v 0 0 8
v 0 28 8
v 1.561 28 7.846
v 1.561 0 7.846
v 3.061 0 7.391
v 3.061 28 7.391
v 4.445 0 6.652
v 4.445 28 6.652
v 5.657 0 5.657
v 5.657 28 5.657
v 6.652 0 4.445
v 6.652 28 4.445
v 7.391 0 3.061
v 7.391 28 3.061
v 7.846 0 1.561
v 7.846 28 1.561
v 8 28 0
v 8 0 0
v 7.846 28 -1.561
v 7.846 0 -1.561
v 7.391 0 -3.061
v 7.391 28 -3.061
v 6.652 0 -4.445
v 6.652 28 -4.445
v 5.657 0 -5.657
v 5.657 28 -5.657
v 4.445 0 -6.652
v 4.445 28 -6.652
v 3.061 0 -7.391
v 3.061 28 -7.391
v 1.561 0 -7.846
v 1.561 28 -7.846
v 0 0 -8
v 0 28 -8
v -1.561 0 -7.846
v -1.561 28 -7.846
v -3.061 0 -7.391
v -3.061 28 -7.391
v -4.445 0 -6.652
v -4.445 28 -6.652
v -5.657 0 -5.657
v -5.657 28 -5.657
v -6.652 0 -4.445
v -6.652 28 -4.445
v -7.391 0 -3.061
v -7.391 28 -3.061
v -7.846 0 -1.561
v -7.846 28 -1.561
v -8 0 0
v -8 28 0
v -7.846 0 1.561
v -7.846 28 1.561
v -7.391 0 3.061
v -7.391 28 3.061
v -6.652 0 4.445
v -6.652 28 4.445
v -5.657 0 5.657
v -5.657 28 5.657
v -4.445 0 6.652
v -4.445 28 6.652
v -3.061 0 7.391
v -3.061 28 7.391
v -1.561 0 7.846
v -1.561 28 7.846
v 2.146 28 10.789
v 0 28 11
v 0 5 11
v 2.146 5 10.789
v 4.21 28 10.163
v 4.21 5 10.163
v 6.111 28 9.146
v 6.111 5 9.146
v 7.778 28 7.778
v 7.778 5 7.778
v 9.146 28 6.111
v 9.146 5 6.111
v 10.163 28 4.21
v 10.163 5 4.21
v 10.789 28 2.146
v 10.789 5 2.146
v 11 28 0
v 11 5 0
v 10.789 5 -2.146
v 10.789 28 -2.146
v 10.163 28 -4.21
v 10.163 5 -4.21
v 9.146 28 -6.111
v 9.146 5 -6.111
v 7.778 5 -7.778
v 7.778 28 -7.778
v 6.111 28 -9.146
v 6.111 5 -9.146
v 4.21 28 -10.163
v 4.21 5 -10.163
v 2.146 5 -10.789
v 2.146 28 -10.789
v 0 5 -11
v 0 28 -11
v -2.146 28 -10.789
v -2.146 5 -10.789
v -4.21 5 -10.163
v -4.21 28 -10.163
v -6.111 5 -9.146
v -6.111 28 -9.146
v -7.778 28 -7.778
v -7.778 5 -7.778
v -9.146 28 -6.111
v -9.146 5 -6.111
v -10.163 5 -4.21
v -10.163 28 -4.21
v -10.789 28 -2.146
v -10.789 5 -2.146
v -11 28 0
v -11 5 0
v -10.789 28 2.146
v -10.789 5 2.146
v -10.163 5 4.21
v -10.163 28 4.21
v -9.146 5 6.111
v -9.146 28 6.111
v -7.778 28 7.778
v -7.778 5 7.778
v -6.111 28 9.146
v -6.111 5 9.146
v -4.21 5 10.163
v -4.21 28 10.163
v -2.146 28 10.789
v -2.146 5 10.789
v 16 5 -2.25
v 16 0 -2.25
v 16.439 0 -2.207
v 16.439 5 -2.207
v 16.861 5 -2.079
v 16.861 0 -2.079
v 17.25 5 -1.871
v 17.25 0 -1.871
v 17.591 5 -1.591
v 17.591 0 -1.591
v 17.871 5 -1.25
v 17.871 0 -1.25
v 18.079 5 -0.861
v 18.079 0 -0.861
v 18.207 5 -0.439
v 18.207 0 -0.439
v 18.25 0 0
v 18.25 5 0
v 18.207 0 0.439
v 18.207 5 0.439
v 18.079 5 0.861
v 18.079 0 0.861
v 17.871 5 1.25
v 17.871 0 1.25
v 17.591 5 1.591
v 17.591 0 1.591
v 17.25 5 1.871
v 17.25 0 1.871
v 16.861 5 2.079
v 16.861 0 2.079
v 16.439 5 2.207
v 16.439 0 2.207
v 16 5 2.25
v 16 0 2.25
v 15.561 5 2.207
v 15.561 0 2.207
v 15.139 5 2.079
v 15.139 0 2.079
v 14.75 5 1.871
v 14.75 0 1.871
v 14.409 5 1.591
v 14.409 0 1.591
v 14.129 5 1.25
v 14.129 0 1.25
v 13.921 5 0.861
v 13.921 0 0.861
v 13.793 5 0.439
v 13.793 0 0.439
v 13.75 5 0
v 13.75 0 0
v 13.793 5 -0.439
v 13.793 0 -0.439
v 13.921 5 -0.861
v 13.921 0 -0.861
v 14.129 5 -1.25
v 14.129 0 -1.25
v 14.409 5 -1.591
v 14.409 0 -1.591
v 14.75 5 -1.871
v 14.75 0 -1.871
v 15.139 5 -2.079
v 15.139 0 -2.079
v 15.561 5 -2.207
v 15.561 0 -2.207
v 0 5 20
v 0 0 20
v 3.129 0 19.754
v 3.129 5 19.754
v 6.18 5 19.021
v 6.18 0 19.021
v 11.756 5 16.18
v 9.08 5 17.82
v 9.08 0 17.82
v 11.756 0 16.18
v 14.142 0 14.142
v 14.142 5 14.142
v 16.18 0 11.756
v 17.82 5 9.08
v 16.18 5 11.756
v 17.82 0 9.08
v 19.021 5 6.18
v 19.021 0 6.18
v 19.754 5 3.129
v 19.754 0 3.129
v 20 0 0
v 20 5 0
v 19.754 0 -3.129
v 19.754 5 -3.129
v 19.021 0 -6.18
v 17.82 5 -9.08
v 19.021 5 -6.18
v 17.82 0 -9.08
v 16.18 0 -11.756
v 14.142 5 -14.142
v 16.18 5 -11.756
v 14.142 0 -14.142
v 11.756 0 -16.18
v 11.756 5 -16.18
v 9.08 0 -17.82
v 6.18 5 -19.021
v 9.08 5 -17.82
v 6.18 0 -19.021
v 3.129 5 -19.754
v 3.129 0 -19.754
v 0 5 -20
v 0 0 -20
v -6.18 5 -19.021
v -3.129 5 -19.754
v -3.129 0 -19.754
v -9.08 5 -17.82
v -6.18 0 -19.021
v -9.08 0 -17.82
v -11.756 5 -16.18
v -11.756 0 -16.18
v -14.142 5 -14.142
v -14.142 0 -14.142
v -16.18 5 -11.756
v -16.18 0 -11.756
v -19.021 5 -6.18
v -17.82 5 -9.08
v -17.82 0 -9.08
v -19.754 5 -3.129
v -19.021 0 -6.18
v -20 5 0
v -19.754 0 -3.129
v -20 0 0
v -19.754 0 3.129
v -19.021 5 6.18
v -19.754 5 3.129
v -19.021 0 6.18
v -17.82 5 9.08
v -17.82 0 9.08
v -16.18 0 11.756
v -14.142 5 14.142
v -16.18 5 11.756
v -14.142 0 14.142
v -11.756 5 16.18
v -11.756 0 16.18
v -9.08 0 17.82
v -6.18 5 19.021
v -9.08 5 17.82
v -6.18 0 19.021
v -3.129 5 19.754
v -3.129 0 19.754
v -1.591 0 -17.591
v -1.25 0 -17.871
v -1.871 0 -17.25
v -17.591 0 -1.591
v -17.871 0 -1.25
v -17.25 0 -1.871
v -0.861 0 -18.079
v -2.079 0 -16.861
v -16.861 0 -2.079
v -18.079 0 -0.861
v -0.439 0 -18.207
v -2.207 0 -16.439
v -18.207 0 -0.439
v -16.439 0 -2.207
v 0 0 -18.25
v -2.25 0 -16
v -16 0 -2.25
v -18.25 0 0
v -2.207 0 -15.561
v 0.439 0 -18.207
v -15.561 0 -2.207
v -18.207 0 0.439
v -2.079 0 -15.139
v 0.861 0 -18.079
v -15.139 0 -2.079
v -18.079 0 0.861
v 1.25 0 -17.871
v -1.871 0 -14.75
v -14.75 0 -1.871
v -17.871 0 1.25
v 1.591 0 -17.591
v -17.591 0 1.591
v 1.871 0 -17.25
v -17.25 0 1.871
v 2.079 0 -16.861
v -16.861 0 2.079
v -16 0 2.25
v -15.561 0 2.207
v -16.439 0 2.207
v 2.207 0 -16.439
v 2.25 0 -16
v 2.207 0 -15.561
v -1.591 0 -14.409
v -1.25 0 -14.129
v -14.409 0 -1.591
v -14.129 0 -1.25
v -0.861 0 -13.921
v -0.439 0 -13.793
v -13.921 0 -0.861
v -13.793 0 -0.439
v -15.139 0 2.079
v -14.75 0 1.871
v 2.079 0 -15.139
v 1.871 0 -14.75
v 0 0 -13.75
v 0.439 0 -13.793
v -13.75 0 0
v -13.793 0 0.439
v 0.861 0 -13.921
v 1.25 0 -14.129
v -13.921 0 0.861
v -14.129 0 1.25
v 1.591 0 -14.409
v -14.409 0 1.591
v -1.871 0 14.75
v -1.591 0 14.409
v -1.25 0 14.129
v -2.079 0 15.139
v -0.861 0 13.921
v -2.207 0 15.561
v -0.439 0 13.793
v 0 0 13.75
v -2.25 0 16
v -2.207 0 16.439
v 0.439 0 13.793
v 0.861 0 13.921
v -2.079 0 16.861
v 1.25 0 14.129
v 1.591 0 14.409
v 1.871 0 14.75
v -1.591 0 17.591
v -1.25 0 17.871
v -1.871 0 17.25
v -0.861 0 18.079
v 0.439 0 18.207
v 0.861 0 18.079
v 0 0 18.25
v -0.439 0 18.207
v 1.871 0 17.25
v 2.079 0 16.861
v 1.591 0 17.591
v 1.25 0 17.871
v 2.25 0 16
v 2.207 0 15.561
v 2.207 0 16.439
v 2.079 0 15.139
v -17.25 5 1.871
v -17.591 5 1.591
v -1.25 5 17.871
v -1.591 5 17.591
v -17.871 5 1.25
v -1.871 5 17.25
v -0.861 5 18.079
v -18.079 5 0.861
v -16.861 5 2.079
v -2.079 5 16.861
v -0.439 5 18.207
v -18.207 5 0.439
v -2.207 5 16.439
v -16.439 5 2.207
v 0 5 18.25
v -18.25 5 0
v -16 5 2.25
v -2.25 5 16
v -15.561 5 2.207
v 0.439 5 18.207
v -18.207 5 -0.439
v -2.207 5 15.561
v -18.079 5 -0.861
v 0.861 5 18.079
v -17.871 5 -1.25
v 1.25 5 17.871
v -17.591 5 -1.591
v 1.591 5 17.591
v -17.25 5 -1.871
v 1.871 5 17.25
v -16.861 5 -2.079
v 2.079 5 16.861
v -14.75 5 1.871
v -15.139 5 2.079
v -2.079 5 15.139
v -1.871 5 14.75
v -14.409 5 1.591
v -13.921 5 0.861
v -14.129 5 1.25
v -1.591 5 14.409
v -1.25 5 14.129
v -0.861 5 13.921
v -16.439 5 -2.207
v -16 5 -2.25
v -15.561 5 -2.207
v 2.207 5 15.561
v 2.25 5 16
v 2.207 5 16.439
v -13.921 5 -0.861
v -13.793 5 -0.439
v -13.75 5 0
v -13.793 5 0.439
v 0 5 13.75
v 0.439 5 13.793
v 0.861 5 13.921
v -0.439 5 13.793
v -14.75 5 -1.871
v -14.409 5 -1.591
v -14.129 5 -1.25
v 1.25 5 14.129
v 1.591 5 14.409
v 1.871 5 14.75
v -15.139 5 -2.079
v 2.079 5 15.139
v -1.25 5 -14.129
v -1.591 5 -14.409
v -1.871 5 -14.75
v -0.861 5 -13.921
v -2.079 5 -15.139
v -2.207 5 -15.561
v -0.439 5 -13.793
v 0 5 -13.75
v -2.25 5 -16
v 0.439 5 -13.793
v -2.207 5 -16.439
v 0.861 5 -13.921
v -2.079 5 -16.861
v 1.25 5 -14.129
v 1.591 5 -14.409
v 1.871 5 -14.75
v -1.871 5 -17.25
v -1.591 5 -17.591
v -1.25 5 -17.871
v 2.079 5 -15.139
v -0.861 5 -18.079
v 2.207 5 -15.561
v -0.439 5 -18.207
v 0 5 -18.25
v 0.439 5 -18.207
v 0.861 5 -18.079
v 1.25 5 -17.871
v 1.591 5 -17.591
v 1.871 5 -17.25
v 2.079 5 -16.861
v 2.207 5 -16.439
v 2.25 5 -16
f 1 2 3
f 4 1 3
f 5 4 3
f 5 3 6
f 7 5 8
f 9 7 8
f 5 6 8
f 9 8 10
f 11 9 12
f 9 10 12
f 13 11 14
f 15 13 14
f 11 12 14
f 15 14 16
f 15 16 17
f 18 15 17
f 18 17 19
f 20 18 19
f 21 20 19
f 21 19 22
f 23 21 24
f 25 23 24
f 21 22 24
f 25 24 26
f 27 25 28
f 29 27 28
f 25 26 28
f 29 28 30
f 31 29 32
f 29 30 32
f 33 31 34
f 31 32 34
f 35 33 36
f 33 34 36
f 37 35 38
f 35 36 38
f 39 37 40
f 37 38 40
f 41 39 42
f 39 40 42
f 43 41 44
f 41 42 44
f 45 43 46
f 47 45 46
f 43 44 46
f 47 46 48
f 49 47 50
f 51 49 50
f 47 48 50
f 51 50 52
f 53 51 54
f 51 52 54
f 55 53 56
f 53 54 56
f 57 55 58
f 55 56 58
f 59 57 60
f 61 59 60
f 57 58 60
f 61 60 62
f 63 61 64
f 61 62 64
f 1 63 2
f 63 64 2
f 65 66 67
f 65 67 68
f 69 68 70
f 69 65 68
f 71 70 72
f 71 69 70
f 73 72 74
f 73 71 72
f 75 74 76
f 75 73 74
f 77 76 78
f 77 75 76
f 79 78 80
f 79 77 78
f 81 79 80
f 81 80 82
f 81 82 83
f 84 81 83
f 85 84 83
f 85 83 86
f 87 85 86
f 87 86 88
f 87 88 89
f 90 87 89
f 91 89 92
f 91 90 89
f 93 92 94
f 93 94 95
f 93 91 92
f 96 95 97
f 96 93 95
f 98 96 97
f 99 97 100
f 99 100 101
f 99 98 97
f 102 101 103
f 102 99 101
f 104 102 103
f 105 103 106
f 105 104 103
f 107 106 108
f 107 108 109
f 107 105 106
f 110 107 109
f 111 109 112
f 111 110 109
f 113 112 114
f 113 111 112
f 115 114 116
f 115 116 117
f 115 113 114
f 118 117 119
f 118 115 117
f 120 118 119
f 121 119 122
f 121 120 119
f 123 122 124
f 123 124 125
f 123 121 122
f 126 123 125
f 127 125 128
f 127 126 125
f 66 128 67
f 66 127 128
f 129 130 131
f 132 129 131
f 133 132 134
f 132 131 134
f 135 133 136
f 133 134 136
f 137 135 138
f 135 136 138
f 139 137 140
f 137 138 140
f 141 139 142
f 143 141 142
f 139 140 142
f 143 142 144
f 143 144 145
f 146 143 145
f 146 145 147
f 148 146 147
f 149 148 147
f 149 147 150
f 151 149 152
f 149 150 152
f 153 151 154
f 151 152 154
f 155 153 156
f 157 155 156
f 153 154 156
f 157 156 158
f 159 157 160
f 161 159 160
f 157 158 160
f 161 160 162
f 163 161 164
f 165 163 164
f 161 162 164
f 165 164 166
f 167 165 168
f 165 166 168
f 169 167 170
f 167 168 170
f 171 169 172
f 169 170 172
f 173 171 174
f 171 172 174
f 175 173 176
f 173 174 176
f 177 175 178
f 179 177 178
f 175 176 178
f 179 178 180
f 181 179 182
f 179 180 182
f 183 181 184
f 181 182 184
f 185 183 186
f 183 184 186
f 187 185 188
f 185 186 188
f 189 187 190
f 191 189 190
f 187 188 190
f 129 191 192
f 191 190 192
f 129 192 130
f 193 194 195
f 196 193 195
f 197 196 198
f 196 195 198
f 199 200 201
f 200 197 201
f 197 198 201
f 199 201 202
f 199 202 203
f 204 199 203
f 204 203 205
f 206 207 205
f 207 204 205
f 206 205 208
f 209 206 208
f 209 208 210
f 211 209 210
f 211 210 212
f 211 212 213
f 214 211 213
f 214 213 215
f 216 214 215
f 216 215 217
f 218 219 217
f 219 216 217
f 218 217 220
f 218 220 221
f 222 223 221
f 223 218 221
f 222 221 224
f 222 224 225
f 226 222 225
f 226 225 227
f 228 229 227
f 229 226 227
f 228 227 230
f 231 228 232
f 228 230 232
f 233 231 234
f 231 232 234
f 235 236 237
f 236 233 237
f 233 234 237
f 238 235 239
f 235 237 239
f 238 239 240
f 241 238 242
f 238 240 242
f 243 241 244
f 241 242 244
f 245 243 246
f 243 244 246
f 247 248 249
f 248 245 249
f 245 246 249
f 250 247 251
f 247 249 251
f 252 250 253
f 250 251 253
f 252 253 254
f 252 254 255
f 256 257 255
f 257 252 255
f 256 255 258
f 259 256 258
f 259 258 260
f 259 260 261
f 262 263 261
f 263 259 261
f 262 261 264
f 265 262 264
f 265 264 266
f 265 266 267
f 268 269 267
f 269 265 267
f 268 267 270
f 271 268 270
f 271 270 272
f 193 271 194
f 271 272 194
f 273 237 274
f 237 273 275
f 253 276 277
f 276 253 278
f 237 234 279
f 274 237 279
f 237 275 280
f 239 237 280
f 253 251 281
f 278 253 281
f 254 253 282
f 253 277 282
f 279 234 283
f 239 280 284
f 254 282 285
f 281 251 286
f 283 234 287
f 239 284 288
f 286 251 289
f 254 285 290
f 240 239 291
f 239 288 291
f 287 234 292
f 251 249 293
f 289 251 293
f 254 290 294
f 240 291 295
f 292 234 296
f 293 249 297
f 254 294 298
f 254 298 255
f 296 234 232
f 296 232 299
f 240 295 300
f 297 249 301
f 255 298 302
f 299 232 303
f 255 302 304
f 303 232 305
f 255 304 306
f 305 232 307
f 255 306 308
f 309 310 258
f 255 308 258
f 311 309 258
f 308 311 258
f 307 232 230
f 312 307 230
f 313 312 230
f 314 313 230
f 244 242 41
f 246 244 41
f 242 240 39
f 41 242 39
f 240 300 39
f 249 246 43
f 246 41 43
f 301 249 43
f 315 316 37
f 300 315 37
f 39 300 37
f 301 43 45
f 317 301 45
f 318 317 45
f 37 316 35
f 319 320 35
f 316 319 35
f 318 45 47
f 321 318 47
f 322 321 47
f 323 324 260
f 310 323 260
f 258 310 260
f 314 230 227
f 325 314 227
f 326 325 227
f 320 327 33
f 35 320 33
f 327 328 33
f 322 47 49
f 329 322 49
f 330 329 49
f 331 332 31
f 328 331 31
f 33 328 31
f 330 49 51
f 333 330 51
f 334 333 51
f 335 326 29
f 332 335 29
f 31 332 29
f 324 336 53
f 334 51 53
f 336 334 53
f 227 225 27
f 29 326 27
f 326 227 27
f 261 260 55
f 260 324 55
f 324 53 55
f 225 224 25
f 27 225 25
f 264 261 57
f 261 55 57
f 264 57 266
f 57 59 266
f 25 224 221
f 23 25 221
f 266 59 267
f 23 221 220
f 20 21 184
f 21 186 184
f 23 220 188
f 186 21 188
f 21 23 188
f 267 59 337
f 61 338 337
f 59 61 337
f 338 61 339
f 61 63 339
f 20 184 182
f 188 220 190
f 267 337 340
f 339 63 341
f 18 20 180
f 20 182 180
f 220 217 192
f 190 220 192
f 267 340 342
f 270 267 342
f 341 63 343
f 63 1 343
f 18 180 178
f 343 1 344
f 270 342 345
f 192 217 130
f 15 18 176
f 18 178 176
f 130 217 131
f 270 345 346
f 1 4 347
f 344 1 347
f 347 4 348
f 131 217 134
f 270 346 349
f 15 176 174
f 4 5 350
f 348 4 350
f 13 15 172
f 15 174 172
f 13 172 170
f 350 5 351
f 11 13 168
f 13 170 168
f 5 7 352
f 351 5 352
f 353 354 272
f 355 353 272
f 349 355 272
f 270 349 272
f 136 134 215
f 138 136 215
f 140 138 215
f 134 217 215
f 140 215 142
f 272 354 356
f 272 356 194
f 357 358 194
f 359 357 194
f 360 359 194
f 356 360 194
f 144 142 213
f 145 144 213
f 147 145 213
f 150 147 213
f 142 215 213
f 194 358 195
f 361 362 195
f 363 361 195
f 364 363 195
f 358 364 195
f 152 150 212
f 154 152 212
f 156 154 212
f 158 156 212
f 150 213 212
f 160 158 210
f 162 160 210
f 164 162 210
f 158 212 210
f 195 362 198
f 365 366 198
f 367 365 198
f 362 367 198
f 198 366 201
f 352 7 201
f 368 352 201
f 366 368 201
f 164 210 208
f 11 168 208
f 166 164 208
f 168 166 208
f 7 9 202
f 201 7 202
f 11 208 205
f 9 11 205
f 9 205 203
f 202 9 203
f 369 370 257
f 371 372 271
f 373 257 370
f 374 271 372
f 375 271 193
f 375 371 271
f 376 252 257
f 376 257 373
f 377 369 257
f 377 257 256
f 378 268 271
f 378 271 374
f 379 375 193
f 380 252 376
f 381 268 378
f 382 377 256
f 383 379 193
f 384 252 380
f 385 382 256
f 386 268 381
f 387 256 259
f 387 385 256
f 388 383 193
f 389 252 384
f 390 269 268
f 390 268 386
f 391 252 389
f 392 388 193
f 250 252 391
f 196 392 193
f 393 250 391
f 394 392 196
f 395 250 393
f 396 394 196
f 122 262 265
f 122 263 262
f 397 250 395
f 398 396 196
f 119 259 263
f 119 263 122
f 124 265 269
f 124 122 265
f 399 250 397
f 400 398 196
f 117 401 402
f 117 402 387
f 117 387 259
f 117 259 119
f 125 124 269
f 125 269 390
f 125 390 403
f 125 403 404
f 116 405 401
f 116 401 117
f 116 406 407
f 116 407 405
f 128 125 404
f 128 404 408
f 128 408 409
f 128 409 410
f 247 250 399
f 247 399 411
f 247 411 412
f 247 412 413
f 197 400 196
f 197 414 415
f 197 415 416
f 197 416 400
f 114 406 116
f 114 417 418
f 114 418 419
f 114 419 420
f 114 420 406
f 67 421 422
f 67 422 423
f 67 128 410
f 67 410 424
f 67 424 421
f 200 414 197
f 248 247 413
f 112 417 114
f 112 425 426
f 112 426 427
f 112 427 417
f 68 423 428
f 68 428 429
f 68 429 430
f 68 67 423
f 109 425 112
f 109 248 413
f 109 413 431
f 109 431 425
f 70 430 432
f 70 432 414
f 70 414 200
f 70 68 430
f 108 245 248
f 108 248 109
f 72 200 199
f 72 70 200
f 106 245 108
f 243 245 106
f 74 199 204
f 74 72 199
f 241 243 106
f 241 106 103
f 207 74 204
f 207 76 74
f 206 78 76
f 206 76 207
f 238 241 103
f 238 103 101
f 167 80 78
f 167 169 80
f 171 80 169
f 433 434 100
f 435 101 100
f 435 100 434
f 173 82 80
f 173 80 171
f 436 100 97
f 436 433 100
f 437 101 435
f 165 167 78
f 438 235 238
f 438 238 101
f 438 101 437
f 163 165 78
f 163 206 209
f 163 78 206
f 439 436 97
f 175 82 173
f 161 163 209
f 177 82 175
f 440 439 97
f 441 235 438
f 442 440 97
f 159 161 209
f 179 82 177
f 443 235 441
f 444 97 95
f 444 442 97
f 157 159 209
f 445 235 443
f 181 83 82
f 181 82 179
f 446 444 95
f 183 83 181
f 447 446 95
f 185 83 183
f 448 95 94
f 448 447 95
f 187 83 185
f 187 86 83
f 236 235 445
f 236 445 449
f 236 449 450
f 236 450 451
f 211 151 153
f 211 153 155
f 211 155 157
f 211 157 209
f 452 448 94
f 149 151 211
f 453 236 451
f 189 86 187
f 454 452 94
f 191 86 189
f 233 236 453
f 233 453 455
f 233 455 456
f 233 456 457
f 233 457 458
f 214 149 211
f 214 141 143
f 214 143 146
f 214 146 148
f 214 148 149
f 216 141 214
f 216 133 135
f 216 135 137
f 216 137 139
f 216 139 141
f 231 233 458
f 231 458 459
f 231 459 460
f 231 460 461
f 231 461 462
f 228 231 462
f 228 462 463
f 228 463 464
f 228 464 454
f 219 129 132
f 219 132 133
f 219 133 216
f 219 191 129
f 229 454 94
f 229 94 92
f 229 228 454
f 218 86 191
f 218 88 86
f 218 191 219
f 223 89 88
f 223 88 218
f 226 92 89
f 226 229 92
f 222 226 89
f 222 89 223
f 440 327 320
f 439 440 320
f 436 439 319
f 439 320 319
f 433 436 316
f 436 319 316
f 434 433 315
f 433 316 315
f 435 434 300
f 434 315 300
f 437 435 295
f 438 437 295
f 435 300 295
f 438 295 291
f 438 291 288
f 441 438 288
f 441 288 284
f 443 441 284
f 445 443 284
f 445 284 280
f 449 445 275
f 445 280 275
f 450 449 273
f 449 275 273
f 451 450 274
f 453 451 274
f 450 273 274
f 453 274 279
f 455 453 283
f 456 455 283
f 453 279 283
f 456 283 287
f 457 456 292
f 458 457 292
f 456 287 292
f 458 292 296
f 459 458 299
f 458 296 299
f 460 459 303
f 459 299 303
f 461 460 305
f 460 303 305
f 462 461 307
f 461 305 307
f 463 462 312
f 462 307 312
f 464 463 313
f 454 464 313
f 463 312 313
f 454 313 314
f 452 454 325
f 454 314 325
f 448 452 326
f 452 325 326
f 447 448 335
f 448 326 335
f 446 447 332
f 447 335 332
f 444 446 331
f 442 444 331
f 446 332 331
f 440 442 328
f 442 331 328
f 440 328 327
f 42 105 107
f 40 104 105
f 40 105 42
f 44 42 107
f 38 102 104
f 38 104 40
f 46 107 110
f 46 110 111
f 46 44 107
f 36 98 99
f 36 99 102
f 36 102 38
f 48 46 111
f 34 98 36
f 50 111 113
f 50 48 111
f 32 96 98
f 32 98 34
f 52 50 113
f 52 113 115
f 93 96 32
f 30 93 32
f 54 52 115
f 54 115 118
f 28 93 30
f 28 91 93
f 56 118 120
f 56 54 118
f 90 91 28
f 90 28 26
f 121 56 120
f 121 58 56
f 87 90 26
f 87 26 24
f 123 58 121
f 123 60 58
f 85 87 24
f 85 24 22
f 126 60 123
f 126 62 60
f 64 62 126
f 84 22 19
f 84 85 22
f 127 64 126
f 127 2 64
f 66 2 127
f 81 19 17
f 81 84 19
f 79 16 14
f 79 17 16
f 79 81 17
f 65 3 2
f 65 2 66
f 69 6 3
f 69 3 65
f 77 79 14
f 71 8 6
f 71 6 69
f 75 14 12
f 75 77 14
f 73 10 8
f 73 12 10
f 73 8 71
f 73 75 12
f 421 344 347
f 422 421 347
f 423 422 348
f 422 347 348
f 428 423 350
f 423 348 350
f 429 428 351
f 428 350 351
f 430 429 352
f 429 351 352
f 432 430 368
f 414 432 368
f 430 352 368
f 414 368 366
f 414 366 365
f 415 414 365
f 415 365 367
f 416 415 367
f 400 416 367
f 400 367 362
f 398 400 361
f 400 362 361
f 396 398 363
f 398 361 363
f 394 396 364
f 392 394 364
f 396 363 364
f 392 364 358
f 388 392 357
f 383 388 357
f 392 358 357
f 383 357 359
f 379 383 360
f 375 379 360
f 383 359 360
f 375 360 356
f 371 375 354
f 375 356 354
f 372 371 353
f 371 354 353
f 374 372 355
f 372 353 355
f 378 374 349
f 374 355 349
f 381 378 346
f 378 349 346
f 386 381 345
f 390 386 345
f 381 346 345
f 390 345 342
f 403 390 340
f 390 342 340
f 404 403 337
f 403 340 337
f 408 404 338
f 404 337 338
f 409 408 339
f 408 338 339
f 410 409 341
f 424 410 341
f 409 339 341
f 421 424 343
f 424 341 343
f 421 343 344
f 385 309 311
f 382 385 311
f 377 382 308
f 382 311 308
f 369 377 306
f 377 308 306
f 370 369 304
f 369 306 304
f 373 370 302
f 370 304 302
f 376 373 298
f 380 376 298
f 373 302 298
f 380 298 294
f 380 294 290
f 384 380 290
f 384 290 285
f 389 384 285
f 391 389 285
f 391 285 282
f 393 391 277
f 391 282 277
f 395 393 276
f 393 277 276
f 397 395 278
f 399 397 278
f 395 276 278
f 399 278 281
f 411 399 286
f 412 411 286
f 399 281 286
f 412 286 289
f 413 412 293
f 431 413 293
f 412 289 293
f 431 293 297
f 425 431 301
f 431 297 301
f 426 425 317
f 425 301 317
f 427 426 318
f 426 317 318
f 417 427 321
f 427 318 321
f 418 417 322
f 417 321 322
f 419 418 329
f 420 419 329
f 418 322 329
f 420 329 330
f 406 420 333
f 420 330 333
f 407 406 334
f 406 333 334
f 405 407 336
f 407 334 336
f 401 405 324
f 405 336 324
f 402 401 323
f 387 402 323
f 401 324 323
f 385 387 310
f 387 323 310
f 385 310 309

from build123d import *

# Parameters (mm, degrees)
SKETCH_1_R          = 20
EXTRUDE_1_DEPTH     = 28
SKETCH_2_OUTSIDE_W  = 54.624
SKETCH_2_OUTSIDE_H  = 54.624
SKETCH_2_OUTSIDE_R  = 11
CUT_EXTRUDE_1_DEPTH = 23
SKETCH_3_R          = 8
CUT_EXTRUDE_2_DEPTH = 28
SKETCH_4_R          = 2.25
CUT_EXTRUDE_3_DEPTH = 5


with BuildPart() as part:
    # 草图1 → 凸台-拉伸1 (new body)
    with BuildSketch(Plane(origin=(0, 0, 0), x_dir=(1, 0, 0), z_dir=(0, 1, 0))):
        with Locations(Location((0, 0, 0), (0, 0, 270))):
            Circle(SKETCH_1_R)
    extrude(amount=EXTRUDE_1_DEPTH)

    # 草图2 outside → 切除-拉伸1 (cut)
    with BuildSketch(Plane(origin=(0, 28, 0), x_dir=(1, 0, 0), z_dir=(0, 1, 0))):
        Rectangle(SKETCH_2_OUTSIDE_W, SKETCH_2_OUTSIDE_H)
        with Locations(Location((0, 0, 0), (0, 0, 270))):
            Circle(SKETCH_2_OUTSIDE_R, mode=Mode.SUBTRACT)
    extrude(amount=-CUT_EXTRUDE_1_DEPTH, mode=Mode.SUBTRACT)

    # 草图3 → 切除-拉伸2 (cut)
    with BuildSketch(Plane(origin=(0, 28, 0), x_dir=(1, 0, 0), z_dir=(0, 1, 0))):
        with Locations(Location((0, 0, 0), (0, 0, 270))):
            Circle(SKETCH_3_R)
    extrude(amount=-CUT_EXTRUDE_2_DEPTH, mode=Mode.SUBTRACT)

    # 草图4 → 切除-拉伸3 (cut)
    with BuildSketch(Plane.XZ):
        with Locations(Location((0, 16, 0), (0, 0, 270))):
            Circle(SKETCH_4_R)
        with Locations(Location((16, 0, 0), (0, 0, 270))):
            Circle(SKETCH_4_R)
        with Locations(Location((0, -16, 0), (0, 0, 90))):
            Circle(SKETCH_4_R)
        with Locations(Location((-16, 0, 0), (0, 0, 90))):
            Circle(SKETCH_4_R)
    extrude(amount=-CUT_EXTRUDE_3_DEPTH, mode=Mode.SUBTRACT)


solid = part.part
